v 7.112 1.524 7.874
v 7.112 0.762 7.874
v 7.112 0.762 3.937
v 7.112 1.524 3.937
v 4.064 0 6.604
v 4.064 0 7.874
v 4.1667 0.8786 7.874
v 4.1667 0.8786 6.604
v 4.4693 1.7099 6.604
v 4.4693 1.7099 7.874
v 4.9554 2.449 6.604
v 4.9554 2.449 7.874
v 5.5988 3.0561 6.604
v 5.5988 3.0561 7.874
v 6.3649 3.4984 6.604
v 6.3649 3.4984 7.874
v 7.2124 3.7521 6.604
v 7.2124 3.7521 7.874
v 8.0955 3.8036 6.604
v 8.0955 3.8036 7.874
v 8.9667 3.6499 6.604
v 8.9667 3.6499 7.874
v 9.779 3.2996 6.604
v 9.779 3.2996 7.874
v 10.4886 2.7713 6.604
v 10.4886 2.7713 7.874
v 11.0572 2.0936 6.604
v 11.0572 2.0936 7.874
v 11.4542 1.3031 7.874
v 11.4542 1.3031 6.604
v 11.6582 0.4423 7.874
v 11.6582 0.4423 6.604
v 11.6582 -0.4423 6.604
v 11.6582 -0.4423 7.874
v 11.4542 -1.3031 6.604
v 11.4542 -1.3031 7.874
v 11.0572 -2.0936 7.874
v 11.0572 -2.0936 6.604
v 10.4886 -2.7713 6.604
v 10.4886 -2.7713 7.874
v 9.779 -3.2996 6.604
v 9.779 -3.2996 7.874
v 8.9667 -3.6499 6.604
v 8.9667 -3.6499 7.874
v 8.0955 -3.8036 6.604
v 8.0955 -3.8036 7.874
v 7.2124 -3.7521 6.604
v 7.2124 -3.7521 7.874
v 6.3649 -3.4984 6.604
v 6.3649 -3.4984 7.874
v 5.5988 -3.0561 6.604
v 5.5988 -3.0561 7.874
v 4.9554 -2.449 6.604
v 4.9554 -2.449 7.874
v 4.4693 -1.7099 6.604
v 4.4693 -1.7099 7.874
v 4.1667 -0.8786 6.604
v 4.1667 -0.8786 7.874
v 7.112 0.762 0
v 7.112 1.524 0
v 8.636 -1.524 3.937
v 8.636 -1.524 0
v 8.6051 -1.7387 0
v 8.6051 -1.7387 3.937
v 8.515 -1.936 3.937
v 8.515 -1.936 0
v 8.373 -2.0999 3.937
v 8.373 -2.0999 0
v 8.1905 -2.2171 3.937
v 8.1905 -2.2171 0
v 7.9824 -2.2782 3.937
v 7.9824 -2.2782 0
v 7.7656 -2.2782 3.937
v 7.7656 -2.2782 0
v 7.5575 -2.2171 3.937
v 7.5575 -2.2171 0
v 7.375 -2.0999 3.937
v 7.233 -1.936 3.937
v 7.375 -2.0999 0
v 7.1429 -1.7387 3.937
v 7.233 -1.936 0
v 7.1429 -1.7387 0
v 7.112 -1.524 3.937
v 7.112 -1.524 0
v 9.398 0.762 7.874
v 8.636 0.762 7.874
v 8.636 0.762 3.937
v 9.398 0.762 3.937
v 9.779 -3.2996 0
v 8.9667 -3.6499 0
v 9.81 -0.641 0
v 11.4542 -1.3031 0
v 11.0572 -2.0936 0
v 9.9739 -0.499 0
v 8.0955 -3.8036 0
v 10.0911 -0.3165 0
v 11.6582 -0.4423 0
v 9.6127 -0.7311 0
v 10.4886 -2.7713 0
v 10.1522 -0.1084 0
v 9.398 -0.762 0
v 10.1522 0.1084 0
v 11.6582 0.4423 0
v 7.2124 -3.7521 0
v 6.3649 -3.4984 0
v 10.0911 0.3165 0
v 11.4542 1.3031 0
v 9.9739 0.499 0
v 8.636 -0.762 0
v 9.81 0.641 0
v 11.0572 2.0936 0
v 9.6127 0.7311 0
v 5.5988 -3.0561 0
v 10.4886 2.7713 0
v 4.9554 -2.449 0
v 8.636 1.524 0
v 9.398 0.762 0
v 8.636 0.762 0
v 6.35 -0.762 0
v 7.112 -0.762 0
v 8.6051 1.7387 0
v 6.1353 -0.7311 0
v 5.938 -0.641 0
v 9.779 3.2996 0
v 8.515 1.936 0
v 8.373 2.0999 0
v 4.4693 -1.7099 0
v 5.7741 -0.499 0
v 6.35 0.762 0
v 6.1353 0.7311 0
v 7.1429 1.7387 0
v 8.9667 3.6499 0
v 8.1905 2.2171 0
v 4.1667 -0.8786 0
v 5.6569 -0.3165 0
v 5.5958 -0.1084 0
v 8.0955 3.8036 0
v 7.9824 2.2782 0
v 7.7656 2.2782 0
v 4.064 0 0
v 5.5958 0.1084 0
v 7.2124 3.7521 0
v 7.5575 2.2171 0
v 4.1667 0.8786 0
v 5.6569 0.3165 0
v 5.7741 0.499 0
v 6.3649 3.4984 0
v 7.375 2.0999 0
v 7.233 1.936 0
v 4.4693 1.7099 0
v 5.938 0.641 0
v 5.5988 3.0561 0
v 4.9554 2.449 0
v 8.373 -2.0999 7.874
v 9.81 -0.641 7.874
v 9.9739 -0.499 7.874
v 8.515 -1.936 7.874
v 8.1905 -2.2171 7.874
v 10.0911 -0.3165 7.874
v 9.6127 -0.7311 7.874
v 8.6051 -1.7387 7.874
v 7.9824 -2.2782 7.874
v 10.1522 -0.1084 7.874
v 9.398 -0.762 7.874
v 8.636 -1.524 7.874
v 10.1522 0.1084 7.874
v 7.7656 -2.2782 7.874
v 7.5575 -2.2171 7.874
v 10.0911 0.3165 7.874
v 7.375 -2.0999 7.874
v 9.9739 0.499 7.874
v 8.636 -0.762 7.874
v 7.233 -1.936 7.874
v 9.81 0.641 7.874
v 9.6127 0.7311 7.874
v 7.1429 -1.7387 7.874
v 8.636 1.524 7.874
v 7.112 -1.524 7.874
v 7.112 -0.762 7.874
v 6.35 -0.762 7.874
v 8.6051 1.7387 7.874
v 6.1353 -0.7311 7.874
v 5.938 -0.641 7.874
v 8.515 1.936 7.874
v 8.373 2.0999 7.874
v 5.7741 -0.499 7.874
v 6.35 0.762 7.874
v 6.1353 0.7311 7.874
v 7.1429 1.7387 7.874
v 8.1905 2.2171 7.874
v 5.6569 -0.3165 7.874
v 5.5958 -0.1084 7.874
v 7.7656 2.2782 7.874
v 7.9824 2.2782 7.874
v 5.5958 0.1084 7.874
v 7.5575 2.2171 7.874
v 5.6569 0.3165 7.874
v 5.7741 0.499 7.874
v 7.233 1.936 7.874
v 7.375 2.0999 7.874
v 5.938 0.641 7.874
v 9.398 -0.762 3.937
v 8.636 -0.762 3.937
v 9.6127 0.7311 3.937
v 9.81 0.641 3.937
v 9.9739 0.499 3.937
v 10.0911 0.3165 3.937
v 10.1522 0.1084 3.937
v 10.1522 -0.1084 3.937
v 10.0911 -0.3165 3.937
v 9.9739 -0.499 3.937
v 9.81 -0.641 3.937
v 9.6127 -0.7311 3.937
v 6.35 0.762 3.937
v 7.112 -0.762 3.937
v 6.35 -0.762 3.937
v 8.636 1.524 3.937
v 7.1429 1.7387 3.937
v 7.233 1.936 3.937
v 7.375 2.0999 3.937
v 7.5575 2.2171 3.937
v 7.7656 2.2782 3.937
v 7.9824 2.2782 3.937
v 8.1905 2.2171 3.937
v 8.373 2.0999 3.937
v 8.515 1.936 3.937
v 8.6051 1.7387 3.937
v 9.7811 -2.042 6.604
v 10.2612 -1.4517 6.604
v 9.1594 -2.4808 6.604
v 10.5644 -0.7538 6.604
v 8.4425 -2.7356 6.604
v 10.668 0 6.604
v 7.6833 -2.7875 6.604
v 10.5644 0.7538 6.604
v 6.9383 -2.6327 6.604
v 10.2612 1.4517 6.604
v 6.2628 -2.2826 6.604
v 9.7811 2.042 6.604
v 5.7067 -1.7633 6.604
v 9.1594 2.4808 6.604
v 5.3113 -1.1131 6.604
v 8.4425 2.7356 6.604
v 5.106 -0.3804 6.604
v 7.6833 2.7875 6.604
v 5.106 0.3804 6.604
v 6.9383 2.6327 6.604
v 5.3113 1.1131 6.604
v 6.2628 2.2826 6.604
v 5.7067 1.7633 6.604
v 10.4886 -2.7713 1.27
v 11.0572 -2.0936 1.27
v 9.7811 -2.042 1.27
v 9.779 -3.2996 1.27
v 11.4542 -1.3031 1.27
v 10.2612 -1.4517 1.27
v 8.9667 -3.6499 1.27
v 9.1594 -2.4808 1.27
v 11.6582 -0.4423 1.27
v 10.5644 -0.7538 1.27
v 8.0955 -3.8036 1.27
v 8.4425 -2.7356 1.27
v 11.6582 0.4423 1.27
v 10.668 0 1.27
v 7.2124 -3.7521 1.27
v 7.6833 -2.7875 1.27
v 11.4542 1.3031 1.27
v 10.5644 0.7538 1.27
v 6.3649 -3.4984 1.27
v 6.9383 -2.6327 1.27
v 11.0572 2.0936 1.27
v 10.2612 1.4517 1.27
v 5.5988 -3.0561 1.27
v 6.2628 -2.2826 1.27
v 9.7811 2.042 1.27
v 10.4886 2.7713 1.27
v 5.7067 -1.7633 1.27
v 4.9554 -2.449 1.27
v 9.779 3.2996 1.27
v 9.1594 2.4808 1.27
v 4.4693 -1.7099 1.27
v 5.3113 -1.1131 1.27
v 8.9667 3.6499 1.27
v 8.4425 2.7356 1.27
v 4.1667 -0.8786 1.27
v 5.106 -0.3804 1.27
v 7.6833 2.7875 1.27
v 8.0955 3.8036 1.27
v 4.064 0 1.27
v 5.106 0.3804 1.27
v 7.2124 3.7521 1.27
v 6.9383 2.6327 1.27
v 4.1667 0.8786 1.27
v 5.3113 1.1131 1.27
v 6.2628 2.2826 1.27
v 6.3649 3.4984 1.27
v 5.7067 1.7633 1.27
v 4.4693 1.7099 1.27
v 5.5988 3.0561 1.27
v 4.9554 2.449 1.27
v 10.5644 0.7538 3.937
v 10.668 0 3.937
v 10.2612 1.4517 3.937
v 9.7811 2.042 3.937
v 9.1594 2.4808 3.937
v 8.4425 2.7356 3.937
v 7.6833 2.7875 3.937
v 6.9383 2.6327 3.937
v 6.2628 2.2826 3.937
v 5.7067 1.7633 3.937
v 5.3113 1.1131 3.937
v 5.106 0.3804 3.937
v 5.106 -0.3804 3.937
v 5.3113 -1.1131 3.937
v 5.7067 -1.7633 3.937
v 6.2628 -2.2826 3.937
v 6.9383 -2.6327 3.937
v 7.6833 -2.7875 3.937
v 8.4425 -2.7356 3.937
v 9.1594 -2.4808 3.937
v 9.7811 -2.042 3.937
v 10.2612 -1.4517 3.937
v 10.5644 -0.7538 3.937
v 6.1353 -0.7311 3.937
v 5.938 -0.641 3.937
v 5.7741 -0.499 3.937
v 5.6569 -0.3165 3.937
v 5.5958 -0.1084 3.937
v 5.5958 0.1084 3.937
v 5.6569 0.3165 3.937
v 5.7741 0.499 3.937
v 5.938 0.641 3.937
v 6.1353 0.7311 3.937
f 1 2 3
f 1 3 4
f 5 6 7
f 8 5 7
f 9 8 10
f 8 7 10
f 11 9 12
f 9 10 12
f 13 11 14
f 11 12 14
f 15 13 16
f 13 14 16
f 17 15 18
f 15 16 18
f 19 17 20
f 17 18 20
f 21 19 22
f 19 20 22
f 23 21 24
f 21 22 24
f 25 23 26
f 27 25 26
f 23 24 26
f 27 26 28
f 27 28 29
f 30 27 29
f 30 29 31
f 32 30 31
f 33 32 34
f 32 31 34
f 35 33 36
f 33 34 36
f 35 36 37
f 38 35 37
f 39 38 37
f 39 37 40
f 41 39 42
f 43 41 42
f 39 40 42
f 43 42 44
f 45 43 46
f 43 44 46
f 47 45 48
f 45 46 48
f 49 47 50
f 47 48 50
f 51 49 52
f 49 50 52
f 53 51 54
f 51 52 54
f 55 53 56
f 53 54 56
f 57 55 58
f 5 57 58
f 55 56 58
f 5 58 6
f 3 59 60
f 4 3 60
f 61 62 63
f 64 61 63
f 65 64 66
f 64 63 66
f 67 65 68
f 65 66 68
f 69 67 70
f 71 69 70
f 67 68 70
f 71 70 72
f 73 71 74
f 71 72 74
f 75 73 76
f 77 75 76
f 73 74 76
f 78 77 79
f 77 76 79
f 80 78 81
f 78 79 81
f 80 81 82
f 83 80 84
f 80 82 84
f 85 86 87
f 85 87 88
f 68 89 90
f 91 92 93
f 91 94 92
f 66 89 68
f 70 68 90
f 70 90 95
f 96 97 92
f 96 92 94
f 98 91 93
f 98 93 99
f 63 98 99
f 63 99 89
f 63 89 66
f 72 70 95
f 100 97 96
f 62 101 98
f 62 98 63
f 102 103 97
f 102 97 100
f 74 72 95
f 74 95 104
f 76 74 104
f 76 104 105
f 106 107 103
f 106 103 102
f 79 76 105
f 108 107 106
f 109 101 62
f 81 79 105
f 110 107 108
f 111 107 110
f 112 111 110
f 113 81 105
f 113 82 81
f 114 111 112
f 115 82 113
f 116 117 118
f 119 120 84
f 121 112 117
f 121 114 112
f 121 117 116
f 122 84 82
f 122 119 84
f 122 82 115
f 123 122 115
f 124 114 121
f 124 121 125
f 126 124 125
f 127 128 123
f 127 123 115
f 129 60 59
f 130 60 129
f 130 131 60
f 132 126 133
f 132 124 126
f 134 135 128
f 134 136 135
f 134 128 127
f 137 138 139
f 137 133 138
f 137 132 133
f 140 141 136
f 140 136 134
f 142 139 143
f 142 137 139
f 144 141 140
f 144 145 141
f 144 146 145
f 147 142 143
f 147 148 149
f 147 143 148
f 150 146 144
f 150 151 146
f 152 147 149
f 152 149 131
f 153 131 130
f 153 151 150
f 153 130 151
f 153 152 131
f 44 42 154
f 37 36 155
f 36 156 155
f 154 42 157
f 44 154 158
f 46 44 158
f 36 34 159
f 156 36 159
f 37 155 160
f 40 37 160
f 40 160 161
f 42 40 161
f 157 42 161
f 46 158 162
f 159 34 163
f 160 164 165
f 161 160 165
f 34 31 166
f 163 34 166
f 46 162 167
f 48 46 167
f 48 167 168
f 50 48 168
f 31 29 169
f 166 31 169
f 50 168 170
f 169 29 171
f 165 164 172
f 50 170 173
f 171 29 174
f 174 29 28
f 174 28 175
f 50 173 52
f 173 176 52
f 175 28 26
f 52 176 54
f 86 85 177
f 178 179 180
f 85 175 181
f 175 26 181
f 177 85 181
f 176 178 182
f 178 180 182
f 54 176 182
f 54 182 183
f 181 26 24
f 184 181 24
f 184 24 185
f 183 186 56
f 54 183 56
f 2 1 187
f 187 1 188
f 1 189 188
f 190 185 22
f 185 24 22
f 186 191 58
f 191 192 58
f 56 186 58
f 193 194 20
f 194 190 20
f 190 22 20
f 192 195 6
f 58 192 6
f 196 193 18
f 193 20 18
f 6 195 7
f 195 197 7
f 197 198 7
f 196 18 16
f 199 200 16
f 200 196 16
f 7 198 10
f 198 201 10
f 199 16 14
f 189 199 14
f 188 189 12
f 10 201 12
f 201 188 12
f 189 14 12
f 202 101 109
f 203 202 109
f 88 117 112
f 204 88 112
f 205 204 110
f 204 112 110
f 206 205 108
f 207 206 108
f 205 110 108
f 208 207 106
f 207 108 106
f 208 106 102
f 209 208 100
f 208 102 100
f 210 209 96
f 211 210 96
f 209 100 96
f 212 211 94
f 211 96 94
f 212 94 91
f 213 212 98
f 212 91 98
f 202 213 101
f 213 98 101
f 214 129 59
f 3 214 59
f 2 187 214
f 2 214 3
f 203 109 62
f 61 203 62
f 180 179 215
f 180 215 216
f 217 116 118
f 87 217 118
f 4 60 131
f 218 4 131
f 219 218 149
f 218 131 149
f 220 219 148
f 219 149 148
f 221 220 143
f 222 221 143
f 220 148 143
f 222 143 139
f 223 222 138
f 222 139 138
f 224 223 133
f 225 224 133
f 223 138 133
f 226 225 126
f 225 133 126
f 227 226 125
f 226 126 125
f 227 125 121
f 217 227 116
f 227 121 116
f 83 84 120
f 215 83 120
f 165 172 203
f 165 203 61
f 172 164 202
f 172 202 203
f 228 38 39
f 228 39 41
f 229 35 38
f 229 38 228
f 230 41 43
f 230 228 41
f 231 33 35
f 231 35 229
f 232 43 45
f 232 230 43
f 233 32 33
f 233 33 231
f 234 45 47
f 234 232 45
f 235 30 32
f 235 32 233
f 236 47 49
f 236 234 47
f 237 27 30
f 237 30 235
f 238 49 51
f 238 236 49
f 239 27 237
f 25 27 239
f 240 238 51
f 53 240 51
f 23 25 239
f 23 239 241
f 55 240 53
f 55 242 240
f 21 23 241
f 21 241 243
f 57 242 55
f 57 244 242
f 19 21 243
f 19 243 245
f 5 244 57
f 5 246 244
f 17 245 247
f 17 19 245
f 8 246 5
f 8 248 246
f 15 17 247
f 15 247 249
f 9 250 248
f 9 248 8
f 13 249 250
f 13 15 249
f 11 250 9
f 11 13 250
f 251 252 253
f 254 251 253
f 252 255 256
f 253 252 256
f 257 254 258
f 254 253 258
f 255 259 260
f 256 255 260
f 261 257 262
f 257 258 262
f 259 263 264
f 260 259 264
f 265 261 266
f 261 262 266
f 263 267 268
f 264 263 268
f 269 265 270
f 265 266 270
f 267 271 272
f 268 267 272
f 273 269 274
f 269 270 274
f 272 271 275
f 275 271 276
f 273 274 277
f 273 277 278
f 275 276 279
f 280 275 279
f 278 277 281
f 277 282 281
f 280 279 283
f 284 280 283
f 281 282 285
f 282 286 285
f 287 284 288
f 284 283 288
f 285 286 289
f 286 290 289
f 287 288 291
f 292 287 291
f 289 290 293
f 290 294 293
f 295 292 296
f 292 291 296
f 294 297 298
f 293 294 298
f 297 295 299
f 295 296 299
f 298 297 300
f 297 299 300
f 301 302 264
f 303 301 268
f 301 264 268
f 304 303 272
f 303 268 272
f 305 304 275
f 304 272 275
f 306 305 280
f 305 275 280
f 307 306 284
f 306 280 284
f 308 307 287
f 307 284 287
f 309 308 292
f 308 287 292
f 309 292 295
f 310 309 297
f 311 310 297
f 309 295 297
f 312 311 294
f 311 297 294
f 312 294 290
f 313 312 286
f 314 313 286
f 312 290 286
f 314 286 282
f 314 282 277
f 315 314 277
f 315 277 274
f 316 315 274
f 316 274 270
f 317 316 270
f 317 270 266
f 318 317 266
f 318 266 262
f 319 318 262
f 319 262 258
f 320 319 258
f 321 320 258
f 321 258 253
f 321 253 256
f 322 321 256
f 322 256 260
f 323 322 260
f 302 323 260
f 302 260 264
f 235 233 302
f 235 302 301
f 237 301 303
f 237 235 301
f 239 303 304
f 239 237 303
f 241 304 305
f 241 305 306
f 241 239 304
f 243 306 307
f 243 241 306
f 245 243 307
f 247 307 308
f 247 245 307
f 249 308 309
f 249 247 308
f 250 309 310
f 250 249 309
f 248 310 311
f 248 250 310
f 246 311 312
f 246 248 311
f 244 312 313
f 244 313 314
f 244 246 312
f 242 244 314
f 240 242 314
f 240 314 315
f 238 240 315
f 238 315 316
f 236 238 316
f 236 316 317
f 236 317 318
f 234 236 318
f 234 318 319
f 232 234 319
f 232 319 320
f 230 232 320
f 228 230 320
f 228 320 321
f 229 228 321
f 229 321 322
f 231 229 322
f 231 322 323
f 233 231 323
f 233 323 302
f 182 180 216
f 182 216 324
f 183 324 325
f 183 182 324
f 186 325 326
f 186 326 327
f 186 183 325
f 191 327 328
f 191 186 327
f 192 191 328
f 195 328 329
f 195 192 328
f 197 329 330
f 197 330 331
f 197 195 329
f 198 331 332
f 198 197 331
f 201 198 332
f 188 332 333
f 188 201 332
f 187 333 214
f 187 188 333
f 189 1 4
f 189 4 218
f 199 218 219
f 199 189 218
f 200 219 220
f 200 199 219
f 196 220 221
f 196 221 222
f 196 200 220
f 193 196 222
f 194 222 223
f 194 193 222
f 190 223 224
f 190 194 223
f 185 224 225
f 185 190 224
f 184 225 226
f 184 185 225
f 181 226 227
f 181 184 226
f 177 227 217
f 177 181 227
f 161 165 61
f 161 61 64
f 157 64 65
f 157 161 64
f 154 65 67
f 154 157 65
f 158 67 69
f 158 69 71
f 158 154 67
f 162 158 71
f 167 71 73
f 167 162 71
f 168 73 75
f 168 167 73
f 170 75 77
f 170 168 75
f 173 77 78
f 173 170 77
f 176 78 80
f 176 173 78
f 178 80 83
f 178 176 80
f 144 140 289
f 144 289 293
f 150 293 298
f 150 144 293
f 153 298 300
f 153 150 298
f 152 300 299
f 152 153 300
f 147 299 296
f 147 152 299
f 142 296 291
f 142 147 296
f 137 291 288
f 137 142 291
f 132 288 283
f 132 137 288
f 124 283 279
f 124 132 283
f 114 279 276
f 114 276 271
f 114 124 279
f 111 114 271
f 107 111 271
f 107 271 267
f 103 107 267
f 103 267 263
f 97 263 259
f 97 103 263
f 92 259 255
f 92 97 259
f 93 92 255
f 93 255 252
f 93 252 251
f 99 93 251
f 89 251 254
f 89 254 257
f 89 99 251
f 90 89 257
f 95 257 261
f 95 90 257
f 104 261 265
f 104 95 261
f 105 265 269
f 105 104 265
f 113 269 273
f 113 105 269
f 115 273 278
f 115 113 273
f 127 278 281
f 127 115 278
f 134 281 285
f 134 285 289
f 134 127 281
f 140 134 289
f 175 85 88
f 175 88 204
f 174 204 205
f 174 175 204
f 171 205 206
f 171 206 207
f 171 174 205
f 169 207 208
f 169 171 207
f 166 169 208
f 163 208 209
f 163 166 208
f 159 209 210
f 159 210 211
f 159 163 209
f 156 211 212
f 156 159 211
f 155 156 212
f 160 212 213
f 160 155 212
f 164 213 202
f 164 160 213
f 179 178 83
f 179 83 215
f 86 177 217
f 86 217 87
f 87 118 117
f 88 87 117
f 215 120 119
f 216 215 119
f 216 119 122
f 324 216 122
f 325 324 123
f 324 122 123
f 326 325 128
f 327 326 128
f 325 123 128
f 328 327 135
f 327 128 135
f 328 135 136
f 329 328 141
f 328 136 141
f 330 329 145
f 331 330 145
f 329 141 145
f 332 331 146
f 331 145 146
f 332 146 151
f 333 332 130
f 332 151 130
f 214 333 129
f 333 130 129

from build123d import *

# Parameters (mm, degrees)
SKETCH1_R           = 2.794
BOSS_EXTRUDE1_DEPTH = 3.937
SKETCH2_R           = 3.81
SKETCH2_R_2         = 2.794
BOSS_EXTRUDE2_DEPTH = 1.27


with BuildPart() as part:
    # Sketch1 → Boss-Extrude1 (new body)
    with BuildSketch(Plane.XY):
        with Locations((7.874, 0)):
            Circle(SKETCH1_R)
        with BuildLine():
            Line((6.35, 0.762), (7.112, 0.762))
            Line((7.112, 0.762), (7.112, 1.524))
            ThreePointArc((7.112, 1.524), (7.874, 2.286), (8.636, 1.524))
            Line((8.636, 1.524), (8.636, 0.762))
            Line((8.636, 0.762), (9.398, 0.762))
            ThreePointArc((9.398, 0.762), (10.16, 0), (9.398, -0.762))
            Line((9.398, -0.762), (8.636, -0.762))
            Line((8.636, -0.762), (8.636, -1.524))
            ThreePointArc((8.636, -1.524), (7.874, -2.286), (7.112, -1.524))
            Line((7.112, -1.524), (7.112, -0.762))
            Line((7.112, -0.762), (6.35, -0.762))
            ThreePointArc((6.35, -0.762), (5.588, 0), (6.35, 0.762))
        make_face(mode=Mode.SUBTRACT)
    boss_extrude1 = extrude(amount=BOSS_EXTRUDE1_DEPTH)

    # Sketch2 → Boss-Extrude2 (add)
    with BuildSketch(Plane(origin=(0, 0, 0), x_dir=(-1, 0, 0), z_dir=(0, 0, -1))):
        with Locations((-7.874, 0)):
            Circle(SKETCH2_R)
        with Locations((-7.874, 0)):
            Circle(SKETCH2_R_2, mode=Mode.SUBTRACT)
    boss_extrude2 = extrude(amount=-BOSS_EXTRUDE2_DEPTH)

    # Mirror1: Boss-Extrude1, Boss-Extrude2 across plane
    add(boss_extrude1.mirror(Plane.XY.offset(3.937)))
    add(boss_extrude2.mirror(Plane.XY.offset(3.937)))


solid = part.part
